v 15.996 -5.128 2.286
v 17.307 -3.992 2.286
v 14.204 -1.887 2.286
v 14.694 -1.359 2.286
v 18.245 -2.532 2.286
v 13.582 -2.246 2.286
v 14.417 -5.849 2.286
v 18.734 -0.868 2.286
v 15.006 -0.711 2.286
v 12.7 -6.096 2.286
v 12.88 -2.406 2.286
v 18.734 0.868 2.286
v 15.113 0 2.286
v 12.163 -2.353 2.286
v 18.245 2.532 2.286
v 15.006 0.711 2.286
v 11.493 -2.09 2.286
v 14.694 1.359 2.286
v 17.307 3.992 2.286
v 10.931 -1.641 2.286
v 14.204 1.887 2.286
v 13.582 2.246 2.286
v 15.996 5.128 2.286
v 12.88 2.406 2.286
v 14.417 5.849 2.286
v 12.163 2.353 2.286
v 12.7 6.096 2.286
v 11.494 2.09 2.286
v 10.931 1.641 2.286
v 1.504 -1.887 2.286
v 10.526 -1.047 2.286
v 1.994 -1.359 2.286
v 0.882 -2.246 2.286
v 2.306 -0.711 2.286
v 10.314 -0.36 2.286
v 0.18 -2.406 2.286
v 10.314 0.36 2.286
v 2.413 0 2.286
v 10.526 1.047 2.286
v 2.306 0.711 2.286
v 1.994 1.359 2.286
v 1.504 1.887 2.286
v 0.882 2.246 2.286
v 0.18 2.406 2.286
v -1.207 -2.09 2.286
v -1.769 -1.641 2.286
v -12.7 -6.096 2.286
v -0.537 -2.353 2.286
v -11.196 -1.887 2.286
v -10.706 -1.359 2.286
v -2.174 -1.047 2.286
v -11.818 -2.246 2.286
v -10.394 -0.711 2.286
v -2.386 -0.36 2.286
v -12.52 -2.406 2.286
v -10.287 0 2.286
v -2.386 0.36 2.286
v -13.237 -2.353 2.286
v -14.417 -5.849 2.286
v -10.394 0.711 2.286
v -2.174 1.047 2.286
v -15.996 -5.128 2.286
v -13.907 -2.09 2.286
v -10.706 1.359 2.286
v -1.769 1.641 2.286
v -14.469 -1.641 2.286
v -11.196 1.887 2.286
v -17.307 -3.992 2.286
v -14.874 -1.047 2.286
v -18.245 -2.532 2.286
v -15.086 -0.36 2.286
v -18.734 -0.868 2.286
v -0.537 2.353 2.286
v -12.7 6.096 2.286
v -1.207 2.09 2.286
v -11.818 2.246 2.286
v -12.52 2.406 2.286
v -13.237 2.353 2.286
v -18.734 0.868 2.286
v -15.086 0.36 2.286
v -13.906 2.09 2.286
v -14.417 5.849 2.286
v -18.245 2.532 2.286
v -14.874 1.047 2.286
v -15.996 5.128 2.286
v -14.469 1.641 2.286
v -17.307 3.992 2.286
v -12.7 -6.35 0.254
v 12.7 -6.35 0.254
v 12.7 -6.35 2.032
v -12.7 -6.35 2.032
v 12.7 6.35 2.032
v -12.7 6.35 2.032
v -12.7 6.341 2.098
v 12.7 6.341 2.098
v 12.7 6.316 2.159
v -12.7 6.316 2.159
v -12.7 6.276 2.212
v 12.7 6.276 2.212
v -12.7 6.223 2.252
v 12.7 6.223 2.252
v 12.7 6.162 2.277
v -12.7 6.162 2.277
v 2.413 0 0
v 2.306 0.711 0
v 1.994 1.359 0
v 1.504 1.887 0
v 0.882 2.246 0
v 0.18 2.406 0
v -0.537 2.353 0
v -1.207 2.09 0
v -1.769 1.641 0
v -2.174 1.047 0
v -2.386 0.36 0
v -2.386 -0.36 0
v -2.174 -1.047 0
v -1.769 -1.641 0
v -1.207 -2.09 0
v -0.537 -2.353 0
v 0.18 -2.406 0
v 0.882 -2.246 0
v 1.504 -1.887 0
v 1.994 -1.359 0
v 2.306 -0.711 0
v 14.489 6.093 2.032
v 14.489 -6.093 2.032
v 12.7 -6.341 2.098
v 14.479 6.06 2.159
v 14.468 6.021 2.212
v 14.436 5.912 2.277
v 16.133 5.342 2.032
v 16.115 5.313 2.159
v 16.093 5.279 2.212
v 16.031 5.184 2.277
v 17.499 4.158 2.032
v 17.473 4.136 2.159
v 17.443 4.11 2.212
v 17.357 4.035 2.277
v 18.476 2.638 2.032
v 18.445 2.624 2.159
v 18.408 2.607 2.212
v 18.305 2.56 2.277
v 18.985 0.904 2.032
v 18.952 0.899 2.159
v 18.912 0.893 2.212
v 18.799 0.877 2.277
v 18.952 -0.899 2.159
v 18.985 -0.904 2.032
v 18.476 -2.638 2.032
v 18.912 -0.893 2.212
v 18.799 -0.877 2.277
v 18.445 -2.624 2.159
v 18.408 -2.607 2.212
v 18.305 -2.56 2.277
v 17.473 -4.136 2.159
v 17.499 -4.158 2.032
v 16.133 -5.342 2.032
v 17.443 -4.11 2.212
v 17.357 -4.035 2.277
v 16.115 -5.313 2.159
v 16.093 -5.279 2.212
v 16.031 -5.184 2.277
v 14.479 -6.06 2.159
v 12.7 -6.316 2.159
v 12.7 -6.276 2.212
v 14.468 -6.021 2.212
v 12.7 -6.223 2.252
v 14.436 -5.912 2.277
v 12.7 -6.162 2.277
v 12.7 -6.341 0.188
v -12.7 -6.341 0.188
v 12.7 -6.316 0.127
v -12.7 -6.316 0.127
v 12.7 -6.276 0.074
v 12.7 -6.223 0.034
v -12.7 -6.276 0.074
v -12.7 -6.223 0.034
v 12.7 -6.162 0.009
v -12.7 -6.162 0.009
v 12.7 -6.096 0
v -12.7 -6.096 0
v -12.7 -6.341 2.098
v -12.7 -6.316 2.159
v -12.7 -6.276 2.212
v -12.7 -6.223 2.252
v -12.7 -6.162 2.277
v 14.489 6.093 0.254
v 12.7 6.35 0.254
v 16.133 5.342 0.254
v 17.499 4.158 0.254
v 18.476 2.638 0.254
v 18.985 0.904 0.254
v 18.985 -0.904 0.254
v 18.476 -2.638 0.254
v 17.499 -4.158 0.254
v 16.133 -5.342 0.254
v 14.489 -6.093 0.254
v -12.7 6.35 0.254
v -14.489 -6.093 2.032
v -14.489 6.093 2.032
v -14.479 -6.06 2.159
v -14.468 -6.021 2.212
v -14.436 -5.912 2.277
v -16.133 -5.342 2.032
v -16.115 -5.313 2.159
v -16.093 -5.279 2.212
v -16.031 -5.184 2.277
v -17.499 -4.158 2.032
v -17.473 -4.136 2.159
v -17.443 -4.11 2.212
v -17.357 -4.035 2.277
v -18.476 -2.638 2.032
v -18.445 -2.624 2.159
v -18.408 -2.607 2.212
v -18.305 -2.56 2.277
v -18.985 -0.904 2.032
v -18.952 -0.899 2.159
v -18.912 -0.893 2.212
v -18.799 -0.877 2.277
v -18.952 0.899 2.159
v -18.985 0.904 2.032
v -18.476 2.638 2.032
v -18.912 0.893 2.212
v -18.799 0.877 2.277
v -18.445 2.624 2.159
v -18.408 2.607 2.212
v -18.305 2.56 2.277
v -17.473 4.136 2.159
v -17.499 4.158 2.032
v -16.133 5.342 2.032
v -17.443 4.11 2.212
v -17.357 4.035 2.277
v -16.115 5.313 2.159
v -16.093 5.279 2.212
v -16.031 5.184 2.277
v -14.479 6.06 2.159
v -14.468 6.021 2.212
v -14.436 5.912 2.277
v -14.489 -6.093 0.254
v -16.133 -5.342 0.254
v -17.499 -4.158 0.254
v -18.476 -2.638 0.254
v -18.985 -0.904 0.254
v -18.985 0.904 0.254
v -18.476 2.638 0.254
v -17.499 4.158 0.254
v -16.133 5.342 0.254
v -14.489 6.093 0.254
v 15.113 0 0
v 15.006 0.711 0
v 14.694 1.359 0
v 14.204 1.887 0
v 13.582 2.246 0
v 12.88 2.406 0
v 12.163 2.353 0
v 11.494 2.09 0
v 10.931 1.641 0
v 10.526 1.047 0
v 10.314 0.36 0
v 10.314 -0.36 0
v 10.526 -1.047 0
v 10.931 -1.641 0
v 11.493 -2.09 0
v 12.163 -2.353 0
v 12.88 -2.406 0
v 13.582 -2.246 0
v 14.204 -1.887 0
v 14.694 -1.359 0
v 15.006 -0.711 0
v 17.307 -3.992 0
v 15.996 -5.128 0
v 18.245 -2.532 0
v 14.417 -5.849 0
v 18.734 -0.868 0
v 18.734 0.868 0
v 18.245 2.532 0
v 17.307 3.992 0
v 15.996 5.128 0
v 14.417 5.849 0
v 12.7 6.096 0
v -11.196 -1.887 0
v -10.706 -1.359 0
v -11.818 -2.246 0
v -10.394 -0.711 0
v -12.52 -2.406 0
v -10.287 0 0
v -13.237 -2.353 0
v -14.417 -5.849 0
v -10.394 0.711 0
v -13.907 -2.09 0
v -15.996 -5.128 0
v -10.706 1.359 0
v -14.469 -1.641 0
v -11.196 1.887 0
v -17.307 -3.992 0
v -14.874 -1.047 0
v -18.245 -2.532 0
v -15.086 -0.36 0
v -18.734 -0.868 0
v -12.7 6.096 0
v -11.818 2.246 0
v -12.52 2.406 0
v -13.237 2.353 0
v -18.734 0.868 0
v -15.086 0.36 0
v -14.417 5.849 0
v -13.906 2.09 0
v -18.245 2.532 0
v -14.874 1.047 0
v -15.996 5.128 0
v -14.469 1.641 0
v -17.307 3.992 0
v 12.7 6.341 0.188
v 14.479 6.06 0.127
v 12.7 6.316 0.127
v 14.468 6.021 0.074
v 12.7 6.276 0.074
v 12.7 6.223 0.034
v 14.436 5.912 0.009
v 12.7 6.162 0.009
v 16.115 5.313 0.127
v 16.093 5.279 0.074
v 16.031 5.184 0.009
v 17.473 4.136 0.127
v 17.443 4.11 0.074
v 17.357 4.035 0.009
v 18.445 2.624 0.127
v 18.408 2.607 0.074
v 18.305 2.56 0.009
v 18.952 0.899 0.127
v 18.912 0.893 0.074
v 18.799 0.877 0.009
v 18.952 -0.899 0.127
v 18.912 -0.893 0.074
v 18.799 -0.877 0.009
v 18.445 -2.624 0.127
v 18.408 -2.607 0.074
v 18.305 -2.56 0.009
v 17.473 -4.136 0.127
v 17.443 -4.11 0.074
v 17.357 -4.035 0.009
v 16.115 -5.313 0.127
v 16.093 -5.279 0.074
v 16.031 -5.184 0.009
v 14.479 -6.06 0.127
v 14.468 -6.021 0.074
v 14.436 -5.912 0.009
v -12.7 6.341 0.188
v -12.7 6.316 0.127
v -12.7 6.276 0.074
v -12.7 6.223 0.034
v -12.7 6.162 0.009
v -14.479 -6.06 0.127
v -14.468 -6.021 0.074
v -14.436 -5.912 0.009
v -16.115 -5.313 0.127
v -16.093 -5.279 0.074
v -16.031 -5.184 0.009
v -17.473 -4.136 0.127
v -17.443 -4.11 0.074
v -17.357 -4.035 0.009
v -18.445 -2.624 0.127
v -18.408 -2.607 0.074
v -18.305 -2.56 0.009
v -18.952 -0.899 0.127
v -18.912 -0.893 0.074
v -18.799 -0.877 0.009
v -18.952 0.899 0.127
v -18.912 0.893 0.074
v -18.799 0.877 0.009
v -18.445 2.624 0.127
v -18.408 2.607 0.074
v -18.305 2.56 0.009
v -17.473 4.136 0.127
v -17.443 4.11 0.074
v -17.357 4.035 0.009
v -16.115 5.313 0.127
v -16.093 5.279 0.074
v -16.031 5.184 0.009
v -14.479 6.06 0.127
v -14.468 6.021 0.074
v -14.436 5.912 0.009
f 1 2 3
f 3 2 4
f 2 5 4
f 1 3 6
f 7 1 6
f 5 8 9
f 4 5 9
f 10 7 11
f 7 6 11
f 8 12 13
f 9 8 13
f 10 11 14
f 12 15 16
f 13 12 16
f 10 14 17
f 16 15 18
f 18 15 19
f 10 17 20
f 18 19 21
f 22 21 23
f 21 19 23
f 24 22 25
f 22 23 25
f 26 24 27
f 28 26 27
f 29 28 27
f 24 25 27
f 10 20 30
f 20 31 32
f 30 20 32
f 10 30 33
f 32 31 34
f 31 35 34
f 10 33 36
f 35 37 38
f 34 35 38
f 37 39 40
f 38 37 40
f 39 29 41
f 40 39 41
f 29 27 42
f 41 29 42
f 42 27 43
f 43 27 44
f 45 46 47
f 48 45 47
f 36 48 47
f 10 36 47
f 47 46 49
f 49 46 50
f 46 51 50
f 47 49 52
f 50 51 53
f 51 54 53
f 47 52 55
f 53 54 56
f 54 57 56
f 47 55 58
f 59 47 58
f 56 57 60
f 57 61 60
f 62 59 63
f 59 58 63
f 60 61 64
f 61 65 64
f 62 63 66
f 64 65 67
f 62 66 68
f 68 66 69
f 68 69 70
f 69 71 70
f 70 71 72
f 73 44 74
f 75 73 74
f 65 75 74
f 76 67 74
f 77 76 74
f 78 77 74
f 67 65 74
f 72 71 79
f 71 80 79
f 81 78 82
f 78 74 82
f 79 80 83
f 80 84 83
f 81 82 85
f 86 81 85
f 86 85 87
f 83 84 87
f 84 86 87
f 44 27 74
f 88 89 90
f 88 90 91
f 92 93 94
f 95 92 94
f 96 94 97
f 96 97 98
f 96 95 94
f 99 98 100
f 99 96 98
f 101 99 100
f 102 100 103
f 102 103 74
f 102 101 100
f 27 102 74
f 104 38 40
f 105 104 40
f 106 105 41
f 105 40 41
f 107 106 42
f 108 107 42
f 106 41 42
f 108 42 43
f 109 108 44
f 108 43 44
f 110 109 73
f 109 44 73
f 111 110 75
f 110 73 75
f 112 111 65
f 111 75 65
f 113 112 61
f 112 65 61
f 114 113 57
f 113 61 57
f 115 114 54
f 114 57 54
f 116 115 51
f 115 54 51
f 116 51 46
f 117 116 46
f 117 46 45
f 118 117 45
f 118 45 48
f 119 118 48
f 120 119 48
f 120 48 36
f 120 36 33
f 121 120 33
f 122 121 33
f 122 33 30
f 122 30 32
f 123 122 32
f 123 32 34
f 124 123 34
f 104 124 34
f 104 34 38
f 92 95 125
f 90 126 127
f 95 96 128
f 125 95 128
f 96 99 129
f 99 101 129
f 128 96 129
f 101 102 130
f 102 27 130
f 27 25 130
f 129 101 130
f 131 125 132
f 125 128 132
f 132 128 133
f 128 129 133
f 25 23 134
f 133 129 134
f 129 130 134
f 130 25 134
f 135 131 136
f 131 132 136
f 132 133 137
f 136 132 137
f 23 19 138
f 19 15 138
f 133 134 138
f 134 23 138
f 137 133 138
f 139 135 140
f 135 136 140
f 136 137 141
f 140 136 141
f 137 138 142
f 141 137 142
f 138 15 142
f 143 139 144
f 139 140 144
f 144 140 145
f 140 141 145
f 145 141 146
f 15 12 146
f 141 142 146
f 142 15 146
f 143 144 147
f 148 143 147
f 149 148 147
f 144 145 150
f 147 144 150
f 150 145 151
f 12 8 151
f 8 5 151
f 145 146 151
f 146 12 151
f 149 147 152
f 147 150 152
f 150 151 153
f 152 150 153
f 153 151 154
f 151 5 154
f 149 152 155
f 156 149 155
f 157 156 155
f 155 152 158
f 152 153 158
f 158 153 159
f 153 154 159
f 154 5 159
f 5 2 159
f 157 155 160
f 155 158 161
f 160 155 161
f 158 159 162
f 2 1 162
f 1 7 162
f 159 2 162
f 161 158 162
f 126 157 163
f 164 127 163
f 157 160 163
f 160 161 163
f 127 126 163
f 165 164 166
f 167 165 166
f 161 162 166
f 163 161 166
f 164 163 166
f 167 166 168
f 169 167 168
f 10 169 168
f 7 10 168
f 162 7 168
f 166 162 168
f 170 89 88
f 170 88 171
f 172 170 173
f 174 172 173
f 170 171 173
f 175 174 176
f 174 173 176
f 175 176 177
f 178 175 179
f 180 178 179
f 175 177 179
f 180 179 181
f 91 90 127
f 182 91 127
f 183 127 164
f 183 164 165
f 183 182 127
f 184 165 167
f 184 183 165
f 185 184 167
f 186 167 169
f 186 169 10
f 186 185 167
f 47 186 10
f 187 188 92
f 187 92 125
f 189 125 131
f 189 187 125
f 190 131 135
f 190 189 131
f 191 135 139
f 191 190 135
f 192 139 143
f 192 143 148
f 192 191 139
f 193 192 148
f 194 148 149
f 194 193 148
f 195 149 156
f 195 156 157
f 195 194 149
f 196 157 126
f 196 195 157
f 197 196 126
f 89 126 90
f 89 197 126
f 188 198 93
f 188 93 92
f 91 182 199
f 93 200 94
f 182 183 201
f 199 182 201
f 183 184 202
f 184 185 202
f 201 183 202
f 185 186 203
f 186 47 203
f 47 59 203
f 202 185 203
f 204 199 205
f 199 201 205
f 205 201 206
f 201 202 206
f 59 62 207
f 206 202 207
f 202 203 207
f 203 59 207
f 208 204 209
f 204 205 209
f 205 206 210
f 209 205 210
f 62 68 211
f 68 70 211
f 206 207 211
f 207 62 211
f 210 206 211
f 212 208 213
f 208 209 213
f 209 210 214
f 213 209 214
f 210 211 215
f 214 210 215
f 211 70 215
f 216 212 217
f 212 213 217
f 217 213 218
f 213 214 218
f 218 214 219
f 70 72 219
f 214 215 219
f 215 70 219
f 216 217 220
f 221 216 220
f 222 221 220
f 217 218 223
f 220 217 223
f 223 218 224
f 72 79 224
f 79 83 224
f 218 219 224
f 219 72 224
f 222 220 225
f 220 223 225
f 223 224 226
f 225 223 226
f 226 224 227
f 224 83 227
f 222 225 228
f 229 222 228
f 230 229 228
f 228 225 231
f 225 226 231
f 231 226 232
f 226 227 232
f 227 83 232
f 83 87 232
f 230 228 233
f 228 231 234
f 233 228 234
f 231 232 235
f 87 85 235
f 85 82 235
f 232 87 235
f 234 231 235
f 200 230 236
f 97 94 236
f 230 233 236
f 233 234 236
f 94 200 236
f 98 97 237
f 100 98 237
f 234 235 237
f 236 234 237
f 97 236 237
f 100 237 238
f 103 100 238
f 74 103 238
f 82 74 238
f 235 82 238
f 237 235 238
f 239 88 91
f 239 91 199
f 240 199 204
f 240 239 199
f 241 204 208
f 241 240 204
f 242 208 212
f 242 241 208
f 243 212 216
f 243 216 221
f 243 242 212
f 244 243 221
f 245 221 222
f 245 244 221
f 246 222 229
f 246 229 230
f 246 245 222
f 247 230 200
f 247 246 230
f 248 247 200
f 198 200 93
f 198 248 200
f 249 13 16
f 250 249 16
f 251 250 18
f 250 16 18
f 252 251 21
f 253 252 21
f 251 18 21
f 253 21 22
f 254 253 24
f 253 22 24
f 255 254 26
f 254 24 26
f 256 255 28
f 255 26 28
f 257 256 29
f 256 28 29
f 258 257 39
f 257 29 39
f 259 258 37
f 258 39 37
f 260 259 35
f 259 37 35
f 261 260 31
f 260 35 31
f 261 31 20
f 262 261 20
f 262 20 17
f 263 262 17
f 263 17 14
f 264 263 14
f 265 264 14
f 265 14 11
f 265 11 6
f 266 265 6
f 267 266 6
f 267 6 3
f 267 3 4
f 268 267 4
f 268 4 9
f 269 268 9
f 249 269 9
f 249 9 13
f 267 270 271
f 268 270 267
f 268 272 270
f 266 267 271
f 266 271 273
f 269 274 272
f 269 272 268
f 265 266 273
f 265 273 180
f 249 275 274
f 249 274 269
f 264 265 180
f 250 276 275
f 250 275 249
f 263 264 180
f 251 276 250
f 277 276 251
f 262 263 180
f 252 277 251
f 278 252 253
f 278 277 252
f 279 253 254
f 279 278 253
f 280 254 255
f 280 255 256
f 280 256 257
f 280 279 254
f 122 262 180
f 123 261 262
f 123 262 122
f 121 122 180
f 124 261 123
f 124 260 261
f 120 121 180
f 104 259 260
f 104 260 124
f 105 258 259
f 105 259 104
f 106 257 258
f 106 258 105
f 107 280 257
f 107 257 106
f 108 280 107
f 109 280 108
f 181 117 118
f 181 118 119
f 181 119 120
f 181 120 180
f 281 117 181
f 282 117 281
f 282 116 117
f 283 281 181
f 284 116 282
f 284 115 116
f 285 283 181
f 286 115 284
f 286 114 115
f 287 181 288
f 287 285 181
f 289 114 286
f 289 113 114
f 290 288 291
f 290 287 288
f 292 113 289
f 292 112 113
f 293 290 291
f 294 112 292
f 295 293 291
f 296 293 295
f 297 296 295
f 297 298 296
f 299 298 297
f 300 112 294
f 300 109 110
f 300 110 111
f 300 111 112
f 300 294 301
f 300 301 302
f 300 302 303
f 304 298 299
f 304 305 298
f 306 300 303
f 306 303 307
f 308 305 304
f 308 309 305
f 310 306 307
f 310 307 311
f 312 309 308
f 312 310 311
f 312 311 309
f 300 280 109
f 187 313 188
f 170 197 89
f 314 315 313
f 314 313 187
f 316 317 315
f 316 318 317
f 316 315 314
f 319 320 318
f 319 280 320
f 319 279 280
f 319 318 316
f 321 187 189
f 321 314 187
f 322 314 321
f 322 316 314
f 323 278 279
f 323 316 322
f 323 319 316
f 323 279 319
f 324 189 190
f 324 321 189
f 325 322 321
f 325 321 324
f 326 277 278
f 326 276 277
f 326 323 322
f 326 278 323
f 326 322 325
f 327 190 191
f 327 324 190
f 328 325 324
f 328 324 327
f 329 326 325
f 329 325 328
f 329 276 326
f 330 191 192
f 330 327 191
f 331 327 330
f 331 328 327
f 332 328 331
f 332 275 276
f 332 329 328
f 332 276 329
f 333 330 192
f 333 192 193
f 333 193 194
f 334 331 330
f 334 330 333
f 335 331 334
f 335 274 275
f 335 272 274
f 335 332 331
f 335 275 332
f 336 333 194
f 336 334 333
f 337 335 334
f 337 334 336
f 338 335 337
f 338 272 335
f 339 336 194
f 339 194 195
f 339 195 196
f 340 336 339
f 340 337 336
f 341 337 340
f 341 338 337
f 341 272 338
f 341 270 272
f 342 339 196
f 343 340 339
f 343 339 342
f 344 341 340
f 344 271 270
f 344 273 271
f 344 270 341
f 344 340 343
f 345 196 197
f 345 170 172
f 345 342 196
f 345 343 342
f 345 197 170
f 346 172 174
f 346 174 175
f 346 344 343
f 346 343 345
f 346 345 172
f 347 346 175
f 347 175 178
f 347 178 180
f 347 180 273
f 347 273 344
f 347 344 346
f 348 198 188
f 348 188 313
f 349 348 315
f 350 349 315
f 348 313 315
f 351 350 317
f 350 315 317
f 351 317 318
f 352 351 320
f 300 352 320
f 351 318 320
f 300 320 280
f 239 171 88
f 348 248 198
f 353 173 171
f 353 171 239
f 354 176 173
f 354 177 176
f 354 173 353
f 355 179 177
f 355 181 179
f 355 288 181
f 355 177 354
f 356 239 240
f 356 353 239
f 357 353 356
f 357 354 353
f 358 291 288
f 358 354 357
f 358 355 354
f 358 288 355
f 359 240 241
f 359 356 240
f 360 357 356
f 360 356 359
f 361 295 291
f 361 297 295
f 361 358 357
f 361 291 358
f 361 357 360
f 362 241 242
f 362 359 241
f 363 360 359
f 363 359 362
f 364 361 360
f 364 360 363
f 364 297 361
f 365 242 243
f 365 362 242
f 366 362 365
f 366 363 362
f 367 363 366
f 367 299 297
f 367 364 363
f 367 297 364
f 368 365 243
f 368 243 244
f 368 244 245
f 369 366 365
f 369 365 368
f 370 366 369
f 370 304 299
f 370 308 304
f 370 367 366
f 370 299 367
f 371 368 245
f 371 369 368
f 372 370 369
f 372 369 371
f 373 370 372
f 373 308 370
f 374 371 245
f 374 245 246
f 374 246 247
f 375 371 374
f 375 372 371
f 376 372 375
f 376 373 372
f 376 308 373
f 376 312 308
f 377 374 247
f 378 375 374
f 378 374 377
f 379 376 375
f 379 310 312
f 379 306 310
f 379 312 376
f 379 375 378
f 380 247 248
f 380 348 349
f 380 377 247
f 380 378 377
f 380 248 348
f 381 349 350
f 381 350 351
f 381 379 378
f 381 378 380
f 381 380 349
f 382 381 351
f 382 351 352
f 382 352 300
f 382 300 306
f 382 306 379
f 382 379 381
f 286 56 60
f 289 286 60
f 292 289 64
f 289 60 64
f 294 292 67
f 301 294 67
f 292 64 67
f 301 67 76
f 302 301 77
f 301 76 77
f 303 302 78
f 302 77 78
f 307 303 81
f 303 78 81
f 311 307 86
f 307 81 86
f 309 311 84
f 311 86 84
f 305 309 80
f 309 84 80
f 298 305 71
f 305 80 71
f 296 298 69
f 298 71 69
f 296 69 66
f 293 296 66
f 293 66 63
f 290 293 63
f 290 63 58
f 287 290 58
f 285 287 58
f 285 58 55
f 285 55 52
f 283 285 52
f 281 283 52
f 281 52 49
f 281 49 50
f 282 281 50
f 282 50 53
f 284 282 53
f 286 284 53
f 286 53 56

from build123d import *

# Parameters (mm, degrees)
EXTRUDE1_DEPTH  = 2.286
SKETCH2_R       = 2.413
EXTRUDE2_DEPTH  = 21.21016566
LPATTERN1_COUNT = 3
LPATTERN1_PITCH = 12.7
FILLET1_R       = 0.254


with BuildPart() as part:
    # Sketch1 → Extrude1 (new body)
    with BuildSketch(Plane.XY):
        with BuildLine():
            Line((-12.7, 6.35), (12.7, 6.35))
            ThreePointArc((12.7, 6.35), (19.05, 0), (12.7, -6.35))
            Line((12.7, -6.35), (-12.7, -6.35))
            ThreePointArc((-12.7, -6.35), (-19.05, 0), (-12.7, 6.35))
        make_face()
    extrude(amount=EXTRUDE1_DEPTH)

    # Sketch2 → Extrude2 (cut, through all)
    with BuildSketch(Plane.XY.offset(2.286)):
        with Locations((-12.7, 0)):
            Circle(SKETCH2_R)
    extrude2 = extrude(amount=-EXTRUDE2_DEPTH, mode=Mode.SUBTRACT)

    # LPattern1: Extrude2 ×3
    with Locations(*[(i * LPATTERN1_PITCH, 0, 0) for i in range(1, LPATTERN1_COUNT)]):
        add(extrude2, mode=Mode.SUBTRACT)

    # Fillet1
    fillet1_edges = [part.edges().sort_by_distance(p)[0] for p in [
        (19.05, 0, 2.286),
        (0, 6.35, 2.286),
        (-19.05, 0, 2.286),
        (0, 6.35, 0),
        (19.05, 0, 0),
        (0, -6.35, 0),
        (-19.05, 0, 0),
        (0, -6.35, 2.286),
    ]]
    fillet(fillet1_edges, radius=FILLET1_R)


solid = part.part
